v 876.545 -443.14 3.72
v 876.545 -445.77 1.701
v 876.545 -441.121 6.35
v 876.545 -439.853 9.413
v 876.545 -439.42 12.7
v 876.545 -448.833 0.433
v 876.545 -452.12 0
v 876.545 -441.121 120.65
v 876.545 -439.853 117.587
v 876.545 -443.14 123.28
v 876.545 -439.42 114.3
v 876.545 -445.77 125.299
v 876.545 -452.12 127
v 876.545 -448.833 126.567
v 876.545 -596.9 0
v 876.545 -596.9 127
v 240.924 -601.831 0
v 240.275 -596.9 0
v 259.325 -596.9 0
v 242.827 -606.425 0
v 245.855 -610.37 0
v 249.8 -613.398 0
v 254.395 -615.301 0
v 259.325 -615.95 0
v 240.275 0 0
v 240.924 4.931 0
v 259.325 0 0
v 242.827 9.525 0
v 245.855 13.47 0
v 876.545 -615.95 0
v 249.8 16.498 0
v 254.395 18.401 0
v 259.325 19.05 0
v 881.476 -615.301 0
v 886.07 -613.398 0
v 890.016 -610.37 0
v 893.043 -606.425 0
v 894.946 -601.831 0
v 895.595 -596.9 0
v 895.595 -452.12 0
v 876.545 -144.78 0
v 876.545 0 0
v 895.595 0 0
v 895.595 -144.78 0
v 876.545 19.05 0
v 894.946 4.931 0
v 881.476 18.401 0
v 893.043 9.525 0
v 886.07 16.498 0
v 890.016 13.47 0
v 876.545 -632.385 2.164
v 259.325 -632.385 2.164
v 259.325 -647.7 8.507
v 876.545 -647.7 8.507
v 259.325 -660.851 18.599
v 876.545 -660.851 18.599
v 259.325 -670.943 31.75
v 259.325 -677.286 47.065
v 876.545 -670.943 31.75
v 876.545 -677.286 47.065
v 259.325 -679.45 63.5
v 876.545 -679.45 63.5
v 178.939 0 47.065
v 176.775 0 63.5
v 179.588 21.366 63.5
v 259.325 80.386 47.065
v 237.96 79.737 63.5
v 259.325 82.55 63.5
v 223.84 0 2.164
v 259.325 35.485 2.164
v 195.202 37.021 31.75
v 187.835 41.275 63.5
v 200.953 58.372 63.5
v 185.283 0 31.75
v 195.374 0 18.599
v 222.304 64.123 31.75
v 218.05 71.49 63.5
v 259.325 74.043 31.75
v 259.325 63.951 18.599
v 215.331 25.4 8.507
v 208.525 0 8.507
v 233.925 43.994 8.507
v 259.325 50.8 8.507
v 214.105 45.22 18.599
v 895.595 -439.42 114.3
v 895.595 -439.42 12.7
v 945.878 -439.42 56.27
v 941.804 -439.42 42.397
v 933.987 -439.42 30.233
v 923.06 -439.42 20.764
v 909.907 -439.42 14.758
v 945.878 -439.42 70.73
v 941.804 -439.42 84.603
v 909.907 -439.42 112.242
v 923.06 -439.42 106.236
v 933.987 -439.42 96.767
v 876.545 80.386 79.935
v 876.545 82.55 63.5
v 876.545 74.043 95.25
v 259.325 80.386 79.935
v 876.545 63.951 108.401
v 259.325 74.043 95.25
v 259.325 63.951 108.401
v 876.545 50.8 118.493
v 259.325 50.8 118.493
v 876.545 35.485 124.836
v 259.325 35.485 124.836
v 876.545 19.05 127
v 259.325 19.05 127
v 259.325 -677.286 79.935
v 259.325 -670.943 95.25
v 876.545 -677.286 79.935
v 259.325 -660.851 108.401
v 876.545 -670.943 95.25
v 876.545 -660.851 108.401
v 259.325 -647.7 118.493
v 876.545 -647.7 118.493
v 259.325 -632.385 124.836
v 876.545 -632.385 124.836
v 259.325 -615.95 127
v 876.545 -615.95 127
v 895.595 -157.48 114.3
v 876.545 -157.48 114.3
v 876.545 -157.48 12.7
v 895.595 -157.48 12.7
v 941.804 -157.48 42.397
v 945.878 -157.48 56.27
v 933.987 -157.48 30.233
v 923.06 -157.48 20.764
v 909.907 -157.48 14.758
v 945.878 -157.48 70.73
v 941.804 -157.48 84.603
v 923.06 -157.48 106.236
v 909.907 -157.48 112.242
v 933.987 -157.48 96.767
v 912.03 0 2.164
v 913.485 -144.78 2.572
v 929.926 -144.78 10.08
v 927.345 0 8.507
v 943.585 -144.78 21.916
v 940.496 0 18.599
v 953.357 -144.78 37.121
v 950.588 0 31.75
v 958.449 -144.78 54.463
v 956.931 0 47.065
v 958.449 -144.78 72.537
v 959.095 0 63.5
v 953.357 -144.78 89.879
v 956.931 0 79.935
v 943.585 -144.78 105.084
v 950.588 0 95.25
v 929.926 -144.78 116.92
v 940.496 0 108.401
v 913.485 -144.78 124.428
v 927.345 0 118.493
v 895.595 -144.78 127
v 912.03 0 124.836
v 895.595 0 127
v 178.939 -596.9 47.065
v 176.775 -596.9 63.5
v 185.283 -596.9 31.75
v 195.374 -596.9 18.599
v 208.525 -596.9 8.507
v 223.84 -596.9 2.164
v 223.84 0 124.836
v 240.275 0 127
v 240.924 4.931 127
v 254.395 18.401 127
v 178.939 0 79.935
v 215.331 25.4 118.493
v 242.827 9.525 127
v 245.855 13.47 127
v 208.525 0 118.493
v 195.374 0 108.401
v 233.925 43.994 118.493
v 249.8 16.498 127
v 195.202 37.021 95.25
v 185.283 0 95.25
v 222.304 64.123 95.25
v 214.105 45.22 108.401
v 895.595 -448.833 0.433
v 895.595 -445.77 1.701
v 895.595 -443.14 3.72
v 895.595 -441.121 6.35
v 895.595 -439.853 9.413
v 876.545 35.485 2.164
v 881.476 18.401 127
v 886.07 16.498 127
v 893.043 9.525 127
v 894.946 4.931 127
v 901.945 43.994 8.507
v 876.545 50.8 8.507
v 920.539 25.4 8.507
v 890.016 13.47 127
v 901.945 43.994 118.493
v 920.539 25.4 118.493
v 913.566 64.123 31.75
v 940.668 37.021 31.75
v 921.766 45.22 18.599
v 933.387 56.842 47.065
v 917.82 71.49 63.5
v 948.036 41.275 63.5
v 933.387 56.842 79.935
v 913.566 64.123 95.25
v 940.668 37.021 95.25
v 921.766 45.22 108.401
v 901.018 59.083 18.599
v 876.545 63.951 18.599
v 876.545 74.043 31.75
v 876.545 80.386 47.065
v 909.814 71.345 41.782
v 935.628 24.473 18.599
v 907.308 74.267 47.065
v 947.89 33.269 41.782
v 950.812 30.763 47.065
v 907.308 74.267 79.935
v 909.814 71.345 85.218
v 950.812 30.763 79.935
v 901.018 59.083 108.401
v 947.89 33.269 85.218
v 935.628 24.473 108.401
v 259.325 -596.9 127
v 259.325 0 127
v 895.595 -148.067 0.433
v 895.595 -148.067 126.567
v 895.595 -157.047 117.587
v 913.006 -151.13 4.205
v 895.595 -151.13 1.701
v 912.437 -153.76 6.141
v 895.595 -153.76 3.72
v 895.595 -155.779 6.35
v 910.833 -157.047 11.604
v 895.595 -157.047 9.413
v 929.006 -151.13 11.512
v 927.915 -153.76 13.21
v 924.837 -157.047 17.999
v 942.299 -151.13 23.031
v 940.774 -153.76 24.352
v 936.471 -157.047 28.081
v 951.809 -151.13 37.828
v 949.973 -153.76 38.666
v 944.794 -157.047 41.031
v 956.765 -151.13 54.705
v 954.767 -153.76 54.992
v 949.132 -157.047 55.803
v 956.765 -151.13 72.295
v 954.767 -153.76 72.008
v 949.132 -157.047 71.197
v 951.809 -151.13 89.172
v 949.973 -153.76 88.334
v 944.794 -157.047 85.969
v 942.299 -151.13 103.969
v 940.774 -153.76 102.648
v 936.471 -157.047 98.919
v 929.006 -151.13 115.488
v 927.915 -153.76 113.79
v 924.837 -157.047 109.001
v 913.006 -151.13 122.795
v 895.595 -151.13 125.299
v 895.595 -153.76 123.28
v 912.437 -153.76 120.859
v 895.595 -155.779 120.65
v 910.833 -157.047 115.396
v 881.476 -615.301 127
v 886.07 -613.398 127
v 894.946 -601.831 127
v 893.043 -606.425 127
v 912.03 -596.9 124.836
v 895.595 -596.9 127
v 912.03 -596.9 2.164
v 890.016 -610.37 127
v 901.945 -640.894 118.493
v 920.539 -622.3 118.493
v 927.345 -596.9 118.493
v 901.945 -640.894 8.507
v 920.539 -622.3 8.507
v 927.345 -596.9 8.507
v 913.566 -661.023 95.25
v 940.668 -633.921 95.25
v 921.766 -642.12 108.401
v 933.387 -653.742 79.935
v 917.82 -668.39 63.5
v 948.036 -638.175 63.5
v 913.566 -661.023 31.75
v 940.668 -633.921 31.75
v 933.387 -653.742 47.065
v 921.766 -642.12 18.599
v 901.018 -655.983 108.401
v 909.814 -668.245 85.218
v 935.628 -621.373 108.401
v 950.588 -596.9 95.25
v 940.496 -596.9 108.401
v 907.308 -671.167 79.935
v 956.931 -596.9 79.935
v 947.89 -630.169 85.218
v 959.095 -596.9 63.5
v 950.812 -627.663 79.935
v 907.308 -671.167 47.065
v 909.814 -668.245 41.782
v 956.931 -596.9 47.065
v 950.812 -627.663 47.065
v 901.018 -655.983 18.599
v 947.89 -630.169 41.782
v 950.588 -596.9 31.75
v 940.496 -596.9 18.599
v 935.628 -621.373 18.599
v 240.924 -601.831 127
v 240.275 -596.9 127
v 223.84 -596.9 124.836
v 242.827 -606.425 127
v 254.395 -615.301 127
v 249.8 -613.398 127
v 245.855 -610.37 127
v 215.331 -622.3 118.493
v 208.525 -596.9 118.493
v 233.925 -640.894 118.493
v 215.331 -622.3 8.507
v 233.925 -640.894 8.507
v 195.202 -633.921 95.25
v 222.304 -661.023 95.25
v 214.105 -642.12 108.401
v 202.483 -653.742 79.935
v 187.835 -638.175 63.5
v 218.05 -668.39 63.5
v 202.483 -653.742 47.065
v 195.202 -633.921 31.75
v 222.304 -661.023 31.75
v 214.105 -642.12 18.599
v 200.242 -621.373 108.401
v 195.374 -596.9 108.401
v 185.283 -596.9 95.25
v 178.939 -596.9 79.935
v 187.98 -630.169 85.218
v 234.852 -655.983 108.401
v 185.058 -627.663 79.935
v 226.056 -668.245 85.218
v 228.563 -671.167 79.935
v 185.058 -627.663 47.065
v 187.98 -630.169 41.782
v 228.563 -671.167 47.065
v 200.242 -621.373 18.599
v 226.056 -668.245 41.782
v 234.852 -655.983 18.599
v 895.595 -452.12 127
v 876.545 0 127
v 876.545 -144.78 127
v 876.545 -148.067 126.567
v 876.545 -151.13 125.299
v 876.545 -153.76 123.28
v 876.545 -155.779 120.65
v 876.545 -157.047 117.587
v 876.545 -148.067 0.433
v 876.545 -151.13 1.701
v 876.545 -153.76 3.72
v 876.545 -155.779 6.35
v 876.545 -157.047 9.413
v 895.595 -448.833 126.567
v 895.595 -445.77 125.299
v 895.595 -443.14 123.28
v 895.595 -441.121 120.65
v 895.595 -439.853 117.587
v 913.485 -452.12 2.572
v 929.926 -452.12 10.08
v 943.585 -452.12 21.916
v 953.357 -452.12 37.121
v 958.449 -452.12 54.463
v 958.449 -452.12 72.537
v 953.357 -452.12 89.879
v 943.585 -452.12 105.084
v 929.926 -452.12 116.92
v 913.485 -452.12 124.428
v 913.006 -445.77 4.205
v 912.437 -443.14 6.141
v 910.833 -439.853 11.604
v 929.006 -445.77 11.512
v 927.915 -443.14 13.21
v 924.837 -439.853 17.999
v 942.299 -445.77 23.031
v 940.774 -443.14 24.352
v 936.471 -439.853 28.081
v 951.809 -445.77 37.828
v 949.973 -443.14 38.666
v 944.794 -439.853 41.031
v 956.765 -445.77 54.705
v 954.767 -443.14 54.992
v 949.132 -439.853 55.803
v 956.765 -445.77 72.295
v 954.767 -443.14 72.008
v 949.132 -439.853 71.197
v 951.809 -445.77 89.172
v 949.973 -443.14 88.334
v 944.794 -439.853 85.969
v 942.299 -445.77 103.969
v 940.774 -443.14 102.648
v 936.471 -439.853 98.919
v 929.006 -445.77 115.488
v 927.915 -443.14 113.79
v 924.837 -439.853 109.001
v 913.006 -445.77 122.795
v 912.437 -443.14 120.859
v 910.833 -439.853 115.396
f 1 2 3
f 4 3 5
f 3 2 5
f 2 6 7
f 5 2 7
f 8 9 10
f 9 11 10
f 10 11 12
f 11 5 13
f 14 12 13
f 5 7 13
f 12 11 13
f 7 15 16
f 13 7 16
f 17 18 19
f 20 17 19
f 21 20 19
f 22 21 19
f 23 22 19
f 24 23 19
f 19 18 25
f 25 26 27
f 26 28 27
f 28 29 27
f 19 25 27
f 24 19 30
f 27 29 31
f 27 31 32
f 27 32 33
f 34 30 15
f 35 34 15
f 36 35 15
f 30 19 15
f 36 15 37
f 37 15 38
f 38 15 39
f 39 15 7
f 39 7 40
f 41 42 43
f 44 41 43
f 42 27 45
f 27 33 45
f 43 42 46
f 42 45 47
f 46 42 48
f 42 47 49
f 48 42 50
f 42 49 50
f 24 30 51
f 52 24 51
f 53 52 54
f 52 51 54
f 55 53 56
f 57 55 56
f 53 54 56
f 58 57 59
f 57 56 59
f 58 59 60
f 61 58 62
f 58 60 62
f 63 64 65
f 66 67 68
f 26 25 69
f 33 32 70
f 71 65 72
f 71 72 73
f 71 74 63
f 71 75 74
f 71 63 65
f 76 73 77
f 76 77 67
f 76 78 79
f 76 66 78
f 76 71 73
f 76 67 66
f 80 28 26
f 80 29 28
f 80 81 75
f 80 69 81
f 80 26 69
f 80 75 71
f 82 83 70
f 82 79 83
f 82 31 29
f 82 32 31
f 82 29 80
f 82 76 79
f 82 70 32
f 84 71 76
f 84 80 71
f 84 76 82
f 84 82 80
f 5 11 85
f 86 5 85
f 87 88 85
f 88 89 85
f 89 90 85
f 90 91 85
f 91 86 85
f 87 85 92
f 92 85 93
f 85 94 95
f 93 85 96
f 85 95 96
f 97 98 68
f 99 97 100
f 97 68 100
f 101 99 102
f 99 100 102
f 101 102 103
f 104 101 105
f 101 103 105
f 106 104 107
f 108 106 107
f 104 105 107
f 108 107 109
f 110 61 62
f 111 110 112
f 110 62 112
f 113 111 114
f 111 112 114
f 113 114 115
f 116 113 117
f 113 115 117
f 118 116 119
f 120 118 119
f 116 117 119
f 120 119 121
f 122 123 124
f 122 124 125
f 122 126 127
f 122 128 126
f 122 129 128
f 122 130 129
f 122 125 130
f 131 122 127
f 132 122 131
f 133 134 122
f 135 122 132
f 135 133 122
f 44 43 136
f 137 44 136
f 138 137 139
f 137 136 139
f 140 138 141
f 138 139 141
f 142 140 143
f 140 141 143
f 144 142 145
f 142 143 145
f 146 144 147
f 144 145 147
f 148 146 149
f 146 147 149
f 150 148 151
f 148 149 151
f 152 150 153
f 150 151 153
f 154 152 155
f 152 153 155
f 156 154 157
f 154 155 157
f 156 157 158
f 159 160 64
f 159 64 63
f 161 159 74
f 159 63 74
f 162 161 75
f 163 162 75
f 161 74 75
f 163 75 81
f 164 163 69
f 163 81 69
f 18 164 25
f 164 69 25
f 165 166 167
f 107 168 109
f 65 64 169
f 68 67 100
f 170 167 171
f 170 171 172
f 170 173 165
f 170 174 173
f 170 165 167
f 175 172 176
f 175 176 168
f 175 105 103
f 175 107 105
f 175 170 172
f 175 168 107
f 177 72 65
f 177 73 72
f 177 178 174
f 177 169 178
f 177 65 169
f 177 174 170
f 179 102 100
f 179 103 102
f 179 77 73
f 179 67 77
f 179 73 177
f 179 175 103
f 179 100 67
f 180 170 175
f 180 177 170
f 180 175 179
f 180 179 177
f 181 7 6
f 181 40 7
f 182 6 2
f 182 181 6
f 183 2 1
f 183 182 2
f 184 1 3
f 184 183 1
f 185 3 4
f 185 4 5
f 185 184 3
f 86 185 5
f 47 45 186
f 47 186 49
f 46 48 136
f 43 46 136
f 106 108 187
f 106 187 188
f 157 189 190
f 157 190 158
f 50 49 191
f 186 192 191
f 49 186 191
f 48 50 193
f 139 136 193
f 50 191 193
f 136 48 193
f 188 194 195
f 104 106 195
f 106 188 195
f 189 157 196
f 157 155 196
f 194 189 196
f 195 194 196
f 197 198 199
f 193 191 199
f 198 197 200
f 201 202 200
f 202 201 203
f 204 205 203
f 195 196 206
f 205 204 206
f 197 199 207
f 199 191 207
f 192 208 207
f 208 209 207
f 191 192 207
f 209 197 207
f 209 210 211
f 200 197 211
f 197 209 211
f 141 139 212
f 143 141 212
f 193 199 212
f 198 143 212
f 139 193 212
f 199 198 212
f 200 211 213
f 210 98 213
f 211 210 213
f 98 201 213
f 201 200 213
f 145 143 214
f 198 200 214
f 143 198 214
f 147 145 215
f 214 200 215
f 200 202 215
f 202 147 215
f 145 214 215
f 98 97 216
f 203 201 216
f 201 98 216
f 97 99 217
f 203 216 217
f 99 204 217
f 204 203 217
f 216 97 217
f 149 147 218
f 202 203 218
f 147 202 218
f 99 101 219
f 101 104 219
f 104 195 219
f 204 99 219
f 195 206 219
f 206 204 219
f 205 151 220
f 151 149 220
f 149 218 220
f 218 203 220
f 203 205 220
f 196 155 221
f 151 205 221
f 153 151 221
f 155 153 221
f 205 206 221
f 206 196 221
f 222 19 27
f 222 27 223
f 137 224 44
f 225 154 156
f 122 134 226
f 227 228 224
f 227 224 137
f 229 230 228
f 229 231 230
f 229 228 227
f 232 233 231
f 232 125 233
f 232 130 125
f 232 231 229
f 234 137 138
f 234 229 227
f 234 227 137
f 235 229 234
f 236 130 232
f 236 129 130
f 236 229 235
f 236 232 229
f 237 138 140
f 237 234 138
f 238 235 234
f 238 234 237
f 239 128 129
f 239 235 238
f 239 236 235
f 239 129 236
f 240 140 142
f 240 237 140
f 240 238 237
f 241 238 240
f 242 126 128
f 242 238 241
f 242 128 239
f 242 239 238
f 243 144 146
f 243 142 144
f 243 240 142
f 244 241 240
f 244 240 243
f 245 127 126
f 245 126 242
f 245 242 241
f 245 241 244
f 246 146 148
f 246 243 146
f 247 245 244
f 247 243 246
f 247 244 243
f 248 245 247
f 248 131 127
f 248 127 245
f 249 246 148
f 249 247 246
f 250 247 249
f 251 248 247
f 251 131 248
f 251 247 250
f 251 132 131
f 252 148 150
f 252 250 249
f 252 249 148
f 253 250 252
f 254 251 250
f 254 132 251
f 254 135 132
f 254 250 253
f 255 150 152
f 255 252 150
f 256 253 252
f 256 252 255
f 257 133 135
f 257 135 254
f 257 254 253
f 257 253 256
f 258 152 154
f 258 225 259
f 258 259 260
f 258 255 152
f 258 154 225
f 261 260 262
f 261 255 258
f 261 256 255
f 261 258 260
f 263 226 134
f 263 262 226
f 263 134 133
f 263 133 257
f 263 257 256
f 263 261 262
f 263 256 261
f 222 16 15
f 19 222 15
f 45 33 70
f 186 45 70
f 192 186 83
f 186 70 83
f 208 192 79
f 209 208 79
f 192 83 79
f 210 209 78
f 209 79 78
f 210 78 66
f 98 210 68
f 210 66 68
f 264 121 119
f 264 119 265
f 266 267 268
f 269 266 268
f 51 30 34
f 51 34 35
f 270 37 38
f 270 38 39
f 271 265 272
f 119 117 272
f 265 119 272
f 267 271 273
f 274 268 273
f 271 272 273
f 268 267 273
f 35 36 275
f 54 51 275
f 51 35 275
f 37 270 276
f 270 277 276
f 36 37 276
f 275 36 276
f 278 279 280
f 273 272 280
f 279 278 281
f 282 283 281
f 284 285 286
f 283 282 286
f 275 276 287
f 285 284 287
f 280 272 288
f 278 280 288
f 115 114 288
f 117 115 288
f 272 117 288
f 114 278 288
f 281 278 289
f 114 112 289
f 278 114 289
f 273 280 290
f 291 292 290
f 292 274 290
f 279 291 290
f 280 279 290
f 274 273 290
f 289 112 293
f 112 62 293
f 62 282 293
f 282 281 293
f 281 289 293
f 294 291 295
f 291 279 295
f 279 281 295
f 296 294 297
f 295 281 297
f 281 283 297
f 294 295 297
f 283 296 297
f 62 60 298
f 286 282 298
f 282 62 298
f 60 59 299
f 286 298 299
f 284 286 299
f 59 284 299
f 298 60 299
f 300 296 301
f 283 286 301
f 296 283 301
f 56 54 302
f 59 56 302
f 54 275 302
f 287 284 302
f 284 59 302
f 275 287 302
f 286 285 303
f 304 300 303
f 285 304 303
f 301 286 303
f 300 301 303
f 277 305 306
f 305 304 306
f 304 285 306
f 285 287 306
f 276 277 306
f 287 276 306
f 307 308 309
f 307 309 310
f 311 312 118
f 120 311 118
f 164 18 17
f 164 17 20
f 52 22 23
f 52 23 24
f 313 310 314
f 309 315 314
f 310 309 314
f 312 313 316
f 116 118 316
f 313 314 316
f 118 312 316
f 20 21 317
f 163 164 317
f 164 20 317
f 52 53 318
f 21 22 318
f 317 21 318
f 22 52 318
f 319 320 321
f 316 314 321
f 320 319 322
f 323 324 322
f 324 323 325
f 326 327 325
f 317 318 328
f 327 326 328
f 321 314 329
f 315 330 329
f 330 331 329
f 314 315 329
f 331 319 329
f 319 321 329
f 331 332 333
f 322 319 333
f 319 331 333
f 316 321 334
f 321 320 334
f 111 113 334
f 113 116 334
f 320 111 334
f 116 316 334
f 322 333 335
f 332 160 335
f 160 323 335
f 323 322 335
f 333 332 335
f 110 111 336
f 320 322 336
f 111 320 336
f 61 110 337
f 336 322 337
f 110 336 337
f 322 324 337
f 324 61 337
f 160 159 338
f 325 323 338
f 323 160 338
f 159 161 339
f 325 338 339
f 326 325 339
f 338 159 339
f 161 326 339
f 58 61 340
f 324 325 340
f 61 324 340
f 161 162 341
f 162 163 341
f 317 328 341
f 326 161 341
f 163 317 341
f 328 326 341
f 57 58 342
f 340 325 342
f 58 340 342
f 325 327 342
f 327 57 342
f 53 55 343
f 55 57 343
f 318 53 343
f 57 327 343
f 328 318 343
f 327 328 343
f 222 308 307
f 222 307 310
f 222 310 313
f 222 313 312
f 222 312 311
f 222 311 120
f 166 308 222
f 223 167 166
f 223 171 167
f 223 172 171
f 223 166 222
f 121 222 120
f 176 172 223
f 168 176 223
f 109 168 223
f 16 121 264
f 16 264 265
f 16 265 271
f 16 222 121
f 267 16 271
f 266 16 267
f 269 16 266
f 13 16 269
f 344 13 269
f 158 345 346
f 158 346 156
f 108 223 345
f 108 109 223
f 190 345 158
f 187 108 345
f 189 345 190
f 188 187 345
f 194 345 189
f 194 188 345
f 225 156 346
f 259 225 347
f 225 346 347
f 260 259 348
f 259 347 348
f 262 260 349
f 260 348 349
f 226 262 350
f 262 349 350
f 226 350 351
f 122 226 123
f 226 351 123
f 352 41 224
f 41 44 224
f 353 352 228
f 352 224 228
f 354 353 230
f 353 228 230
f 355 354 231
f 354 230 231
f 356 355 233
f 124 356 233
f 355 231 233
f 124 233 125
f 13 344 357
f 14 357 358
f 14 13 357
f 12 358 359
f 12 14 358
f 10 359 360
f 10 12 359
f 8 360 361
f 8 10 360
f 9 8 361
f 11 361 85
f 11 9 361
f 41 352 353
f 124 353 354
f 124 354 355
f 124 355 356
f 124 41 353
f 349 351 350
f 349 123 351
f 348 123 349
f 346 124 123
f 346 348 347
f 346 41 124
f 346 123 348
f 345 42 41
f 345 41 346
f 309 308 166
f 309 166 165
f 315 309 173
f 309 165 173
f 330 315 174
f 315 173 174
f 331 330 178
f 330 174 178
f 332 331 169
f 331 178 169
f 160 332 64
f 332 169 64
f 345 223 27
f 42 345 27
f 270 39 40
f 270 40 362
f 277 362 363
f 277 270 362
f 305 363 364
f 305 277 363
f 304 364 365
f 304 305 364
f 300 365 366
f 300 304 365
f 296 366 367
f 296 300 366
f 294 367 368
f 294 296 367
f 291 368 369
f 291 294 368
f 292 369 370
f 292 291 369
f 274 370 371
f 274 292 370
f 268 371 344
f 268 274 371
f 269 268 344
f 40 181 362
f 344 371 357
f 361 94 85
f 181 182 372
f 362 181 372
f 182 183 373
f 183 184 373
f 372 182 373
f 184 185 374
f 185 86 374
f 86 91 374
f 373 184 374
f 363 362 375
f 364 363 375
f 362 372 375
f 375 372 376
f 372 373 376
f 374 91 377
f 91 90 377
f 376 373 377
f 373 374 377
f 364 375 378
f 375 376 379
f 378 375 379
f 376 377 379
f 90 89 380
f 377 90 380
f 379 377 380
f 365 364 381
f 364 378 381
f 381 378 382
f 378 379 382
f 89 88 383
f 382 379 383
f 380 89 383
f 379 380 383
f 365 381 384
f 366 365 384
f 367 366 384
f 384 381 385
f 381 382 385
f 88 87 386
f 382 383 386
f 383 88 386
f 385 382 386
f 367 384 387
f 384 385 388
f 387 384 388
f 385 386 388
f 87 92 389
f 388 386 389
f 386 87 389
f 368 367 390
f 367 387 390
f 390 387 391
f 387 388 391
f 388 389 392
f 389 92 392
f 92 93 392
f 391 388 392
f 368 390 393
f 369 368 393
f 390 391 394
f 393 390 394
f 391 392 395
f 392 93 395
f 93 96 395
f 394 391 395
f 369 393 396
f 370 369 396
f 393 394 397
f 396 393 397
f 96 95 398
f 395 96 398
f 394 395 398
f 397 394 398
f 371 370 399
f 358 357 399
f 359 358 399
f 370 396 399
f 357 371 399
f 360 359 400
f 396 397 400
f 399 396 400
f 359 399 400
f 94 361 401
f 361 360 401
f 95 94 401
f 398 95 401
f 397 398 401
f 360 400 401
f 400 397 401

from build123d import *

# Parameters (mm, degrees)
F1_DEPTH  = 617.22
F0_W      = 19.05
F0_H      = 127
F2_DEPTH  = 596.9
F3_DEPTH  = 152.4
F6_ANGLE  = 90
F12_ANGLE = -90
F18_ANGLE = 90
F19_ANGLE = 90
F23_ANGLE = 90
F24_ANGLE = 90
F25_DEPTH = 5.08
F26_DEPTH = 5.08
F27_R     = 12.7


with BuildPart() as f1:
    # F0 (on Front) → F1 (new body)
    with BuildSketch(Plane.XZ):
        with BuildLine():
            Line((19.05, 127), (19.05, 63.5))
            Line((19.05, 63.5), (82.55, 63.5))
            ThreePointArc((82.55, 63.5), (63.9512806053, 108.4012806053), (19.05, 127))
        make_face()
        with BuildLine():
            Line((19.05, 63.5), (19.05, 0))
            ThreePointArc((19.05, 0), (63.9512806053, 18.5987193947), (82.55, 63.5))
            Line((82.55, 63.5), (19.05, 63.5))
        make_face()
        Polygon((0, 127), (0, 0), (19.05, 0), (19.05, 63.5), (19.05, 127), align=None)
    extrude(amount=F1_DEPTH)


with BuildPart() as f2:
    # F0 (on Front) → F2 (new body)
    with BuildSketch(Plane.XZ):
        with Locations((249.8001466751, 63.5)):
            Rectangle(F0_W, F0_H)
        with BuildLine():
            ThreePointArc((240.2751466751, 127), (195.3738660698, 108.4012806053), (176.7751466751, 63.5))
            ThreePointArc((176.7751466751, 63.5), (195.3738660698, 18.5987193947), (240.2751466751, 0))
            Line((240.2751466751, 0), (240.2751466751, 127))
        make_face()
    extrude(amount=F2_DEPTH)


with BuildPart() as f3:
    # F0 (on Front) → F3 (new body)
    with BuildSketch(Plane.XZ):
        with BuildLine():
            ThreePointArc((-240.2751466751, 0), (-195.3738660698, 18.5987193947), (-176.7751466751, 63.5))
            ThreePointArc((-176.7751466751, 63.5), (-195.3738660698, 108.4012806053), (-240.2751466751, 127))
            Line((-240.2751466751, 127), (-240.2751466751, 0))
        make_face()
        with Locations((-249.8001466751, 63.5)):
            Rectangle(F0_W, F0_H)
    extrude(amount=F3_DEPTH)


with BuildPart() as f4_1:
    # F4: copy of F3
    add(f3.part.moved(Location((127, 0, 0))))


with BuildPart() as f5_1:
    # F5: copy of F1
    add(f1.part.moved(Location((127, 127, 254))))


with BuildPart() as f5_1_1:
    # F6: moved
    add(f5_1.part.rotate(Axis((127, 127, 317.5), (0, 0, 1)), F6_ANGLE))


with BuildPart() as f5_1_2:
    # F9: moved
    add(f5_1_1.part.moved(Location((0, -127, -254))))


with BuildPart() as f5_1_3:
    # F11: moved
    add(f5_1_2.part.moved(Location((132.3251466751, 0, 0))))


with BuildPart() as f1_1:
    # F12: moved
    add(f1.part.rotate(Axis((0, -617.22, 63.5), (0, 0, 1)), F12_ANGLE))


with BuildPart() as f1_2:
    # F14: moved
    add(f1_1.part.moved(Location((0, 20.32, 0))))


with BuildPart() as f1_3:
    # F16: moved
    add(f1_2.part.moved(Location((259.3251466751, 0, 0))))


    add(f2.part)  # F18 merges F2
    # F2_face1 (on face) → F18 (revolve)
    with BuildSketch(Plane(origin=(223.4065289788, -596.9, 63.5), x_dir=(1, 0, 0), z_dir=(0, -1, 0))):
        with BuildLine():
            Line((35.9186176963, 63.5), (16.8686176963, 63.5))
            ThreePointArc((16.8686176963, 63.5), (-46.6313823037, 0), (16.8686176963, -63.5))
            Line((16.8686176963, -63.5), (35.9186176963, -63.5))
            Line((35.9186176963, -63.5), (35.9186176963, 63.5))
        make_face()
    revolve(axis=Axis((259.3251466751, -596.9, 63.5), (0, 0, 1)), revolution_arc=F18_ANGLE)


    add(f5_1_3.part)  # F19 merges F5_1
    # F0 (on Front) → F19 (revolve)
    with BuildSketch(Plane.XZ):
        with Locations((249.8001466751, 63.5)):
            Rectangle(F0_W, F0_H)
        with BuildLine():
            ThreePointArc((240.2751466751, 127), (195.3738660698, 108.4012806053), (176.7751466751, 63.5))
            ThreePointArc((176.7751466751, 63.5), (195.3738660698, 18.5987193947), (240.2751466751, 0))
            Line((240.2751466751, 0), (240.2751466751, 127))
        make_face()
    revolve(axis=Axis((259.3251466751, 0, 63.5), (0, 0, -1)), revolution_arc=F19_ANGLE)



with BuildPart() as f4_1_1:
    # F21: moved
    add(f4_1.part.moved(Location((1008.8702933502, -444.5, 0))))


with BuildPart() as f3_1:
    # F22: moved
    add(f3.part.moved(Location((1135.8702933502, 0, 0))))


with BuildPart() as f1_4:
    add(f1_3.part)

    add(f3_1.part)  # F23 merges F3
    # F5_face1 (on face) → F23 (revolve)
    with BuildSketch(Plane(origin=(876.5451466751, 35.9186176963, 63.5), x_dir=(0, 1, 0), z_dir=(1, 0, 0))):
        with BuildLine():
            ThreePointArc((-16.8686176963, -63.5), (46.6313823037, 0), (-16.8686176963, 63.5))
            Line((-16.8686176963, 63.5), (-35.9186176963, 63.5))
            Line((-35.9186176963, 63.5), (-35.9186176963, -63.5))
            Line((-35.9186176963, -63.5), (-16.8686176963, -63.5))
        make_face()
    revolve(axis=Axis((876.5451466751, 0, 63.5), (0, 0, -1)), revolution_arc=F23_ANGLE)


    add(f4_1_1.part)  # F24 merges F4_1
    # F1_face2 (on face) → F24 (revolve)
    with BuildSketch(Plane(origin=(876.5451466751, -632.8186176963, 63.5), x_dir=(0, 1, 0), z_dir=(1, 0, 0))):
        with BuildLine():
            ThreePointArc((16.8686176963, 63.5), (-46.6313823037, 0), (16.8686176963, -63.5))
            Line((16.8686176963, -63.5), (35.9186176963, -63.5))
            Line((35.9186176963, -63.5), (35.9186176963, 63.5))
            Line((35.9186176963, 63.5), (16.8686176963, 63.5))
        make_face()
    revolve(axis=Axis((876.5451466751, -596.9, 63.5), (0, 0, 1)), revolution_arc=F24_ANGLE)

    # F25 (add): a face of the model
    f25_faces = [f1_4.faces().sort_by_distance(p)[0] for p in [
        (912.4637643715, -444.5, 63.5),
    ]]
    extrude(f25_faces, amount=F25_DEPTH)

    # F26 (add): a face of the model
    f26_faces = [f1_4.faces().sort_by_distance(p)[0] for p in [
        (912.4637643715, -152.4, 63.5),
    ]]
    extrude(f26_faces, amount=F26_DEPTH)

    # F27
    f27_edges = [f1_4.edges().sort_by_distance(p)[0] for p in [
        (959.095147, -439.42, 63.5),
        (886.070147, -439.42, 127),
        (886.070147, -439.42, 0),
        (959.095147, -157.48, 63.5),
        (886.070147, -157.48, 127),
        (886.070147, -157.48, 0),
    ]]
    fillet(f27_edges, radius=F27_R)


solid = f1_4.part
